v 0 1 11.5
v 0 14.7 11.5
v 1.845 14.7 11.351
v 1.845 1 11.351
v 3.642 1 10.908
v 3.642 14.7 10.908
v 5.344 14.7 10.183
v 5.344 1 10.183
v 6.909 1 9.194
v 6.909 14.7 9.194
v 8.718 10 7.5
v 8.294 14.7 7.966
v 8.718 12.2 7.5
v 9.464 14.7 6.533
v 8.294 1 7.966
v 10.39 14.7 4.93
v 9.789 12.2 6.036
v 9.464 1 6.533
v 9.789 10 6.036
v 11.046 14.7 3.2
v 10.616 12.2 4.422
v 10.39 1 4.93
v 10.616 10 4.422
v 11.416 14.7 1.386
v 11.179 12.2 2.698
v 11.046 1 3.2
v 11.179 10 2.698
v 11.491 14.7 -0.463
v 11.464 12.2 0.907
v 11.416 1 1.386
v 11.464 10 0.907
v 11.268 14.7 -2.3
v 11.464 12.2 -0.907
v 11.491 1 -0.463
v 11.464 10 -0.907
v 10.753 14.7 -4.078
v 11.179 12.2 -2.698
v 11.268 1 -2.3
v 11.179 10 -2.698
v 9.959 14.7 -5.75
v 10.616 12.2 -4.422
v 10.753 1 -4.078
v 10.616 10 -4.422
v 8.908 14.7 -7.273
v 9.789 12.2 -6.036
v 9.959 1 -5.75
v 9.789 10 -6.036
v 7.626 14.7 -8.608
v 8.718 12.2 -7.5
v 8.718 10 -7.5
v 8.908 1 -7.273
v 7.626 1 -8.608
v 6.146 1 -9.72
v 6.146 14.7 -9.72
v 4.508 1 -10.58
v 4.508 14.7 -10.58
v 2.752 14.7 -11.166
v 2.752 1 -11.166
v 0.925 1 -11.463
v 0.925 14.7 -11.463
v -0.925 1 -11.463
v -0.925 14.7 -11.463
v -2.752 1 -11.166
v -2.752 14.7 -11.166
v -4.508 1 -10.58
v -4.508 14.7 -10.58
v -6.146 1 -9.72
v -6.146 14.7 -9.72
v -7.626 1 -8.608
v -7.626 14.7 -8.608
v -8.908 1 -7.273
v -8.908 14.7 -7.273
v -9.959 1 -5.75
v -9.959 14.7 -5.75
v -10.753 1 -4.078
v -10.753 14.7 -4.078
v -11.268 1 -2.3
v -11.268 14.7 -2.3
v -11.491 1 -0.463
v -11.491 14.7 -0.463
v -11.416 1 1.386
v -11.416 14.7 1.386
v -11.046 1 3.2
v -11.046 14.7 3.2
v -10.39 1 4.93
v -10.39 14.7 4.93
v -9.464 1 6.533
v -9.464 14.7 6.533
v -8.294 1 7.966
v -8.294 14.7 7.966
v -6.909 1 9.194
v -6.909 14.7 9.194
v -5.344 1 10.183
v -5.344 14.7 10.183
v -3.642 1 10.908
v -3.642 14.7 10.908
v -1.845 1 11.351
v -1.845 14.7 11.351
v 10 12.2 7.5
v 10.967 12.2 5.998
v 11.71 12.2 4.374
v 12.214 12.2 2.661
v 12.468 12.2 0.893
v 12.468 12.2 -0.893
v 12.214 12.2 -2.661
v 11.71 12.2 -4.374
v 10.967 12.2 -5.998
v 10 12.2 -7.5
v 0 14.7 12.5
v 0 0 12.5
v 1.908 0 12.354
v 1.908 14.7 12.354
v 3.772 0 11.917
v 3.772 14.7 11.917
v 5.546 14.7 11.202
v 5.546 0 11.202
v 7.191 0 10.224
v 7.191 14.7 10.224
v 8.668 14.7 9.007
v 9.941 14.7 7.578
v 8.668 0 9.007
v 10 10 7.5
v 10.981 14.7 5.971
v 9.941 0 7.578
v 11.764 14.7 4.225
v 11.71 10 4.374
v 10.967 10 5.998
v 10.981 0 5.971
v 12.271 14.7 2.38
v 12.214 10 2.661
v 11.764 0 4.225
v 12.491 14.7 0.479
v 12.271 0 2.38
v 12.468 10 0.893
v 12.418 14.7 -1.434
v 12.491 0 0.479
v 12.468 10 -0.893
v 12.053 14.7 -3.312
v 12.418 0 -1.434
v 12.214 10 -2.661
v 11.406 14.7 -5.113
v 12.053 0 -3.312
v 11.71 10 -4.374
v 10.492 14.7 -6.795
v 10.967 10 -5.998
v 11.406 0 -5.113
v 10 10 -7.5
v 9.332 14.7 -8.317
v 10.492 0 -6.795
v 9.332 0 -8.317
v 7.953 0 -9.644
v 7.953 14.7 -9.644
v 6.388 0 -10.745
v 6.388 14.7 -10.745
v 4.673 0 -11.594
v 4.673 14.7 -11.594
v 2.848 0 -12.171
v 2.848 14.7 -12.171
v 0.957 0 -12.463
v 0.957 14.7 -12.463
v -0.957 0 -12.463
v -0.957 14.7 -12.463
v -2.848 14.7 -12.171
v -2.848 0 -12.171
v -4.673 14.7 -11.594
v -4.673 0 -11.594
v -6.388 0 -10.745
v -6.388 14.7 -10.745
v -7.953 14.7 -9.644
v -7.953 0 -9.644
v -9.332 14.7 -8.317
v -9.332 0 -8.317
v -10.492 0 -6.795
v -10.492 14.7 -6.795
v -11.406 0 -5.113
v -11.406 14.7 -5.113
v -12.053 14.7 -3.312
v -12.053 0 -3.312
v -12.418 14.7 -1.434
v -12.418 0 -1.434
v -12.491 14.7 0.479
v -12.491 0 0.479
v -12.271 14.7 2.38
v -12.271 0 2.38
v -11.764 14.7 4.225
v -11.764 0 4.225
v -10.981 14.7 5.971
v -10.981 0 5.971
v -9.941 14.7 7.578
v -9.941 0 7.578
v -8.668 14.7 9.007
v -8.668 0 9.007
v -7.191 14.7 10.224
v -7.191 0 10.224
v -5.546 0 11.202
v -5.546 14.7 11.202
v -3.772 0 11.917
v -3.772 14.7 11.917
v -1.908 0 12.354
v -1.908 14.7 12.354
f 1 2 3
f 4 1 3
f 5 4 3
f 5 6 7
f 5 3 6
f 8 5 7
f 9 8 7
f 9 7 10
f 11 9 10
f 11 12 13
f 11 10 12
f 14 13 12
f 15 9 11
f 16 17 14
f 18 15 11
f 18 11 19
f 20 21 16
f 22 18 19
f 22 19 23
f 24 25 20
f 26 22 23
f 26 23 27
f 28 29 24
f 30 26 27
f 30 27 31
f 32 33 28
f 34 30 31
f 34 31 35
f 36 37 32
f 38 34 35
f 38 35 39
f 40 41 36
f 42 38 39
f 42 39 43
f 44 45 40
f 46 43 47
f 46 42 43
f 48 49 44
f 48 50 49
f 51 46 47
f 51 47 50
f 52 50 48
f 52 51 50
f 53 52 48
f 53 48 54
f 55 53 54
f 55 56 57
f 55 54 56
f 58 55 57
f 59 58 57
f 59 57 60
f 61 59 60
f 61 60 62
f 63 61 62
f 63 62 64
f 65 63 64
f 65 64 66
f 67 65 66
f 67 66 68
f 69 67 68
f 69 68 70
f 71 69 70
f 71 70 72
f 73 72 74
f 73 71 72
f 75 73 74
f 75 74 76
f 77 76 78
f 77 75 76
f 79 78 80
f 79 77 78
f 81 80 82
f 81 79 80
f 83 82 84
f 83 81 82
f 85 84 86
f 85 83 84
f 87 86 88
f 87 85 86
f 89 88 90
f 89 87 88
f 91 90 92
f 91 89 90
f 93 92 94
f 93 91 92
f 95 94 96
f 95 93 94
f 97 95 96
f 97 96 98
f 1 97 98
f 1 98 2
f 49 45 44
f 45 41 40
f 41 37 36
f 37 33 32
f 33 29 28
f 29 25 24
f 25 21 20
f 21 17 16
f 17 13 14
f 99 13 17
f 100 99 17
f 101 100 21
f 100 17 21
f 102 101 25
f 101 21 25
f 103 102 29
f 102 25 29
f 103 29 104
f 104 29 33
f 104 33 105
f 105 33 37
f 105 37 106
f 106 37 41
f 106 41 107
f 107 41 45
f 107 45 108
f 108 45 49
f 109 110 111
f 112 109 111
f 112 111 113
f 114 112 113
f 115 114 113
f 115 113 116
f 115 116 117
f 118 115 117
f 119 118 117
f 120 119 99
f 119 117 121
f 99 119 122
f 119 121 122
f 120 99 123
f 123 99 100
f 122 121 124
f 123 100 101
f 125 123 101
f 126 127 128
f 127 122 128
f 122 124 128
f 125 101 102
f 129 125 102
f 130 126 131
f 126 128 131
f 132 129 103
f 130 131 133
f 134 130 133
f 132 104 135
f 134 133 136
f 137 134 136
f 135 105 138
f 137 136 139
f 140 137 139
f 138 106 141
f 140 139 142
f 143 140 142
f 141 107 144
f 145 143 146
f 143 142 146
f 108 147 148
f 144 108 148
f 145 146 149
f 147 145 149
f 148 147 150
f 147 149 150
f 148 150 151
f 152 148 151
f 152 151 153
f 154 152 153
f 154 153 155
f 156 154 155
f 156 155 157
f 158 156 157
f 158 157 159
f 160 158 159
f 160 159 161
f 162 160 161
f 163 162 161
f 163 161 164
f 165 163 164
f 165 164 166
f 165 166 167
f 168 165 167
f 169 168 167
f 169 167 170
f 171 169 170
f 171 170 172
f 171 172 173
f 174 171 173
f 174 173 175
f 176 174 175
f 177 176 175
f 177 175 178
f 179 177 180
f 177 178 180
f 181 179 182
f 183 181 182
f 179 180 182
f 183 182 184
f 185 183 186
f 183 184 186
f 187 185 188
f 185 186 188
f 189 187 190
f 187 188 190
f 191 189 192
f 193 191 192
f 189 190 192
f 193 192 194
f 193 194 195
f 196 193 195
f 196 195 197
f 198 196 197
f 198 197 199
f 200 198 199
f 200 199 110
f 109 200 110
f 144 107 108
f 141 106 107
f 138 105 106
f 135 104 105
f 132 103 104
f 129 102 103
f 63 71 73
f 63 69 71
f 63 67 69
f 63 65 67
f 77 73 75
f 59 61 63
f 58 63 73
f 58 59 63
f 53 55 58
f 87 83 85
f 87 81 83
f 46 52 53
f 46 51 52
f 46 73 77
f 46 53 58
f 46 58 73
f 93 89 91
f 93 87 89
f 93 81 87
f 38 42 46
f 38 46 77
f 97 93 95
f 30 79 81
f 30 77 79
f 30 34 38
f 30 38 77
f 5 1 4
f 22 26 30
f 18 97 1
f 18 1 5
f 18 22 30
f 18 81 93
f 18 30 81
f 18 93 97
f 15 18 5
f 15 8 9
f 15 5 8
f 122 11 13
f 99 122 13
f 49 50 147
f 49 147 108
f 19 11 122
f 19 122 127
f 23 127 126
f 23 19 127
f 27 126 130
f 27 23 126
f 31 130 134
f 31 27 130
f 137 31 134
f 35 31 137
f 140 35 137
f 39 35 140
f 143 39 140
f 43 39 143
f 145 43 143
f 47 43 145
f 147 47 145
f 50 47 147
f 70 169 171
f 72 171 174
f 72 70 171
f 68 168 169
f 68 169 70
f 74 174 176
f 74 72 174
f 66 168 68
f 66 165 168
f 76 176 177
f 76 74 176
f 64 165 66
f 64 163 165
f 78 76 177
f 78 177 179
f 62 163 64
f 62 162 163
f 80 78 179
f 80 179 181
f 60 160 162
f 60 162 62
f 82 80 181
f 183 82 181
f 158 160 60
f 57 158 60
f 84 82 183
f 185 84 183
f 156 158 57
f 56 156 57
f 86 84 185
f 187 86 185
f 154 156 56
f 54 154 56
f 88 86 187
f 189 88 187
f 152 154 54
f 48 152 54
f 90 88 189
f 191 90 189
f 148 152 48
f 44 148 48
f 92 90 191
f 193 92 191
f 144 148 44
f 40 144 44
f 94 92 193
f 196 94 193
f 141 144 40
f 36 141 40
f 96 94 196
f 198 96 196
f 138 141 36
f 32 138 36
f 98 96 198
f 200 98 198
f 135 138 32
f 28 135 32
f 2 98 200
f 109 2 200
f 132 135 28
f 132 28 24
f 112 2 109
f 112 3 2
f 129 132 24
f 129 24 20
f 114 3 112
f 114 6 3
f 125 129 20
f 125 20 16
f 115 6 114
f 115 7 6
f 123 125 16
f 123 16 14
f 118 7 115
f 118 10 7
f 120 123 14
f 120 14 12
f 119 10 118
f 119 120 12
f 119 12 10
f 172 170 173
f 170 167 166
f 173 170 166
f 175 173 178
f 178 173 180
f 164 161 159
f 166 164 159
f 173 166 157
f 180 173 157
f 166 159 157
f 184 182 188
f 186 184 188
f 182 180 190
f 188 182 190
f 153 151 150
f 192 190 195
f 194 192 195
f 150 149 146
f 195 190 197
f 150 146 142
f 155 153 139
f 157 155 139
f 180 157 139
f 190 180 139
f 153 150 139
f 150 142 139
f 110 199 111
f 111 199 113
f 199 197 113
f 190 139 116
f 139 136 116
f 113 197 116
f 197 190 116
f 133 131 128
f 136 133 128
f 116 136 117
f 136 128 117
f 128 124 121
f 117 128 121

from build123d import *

# Parameters (mm, degrees)
SKETCH1_R           = 12.5
BOSS_EXTRUDE1_DEPTH = 14.7
SHELL1_T            = -1
SKETCH2_W           = 15
SKETCH2_H           = 2.2
CUT_EXTRUDE1_DEPTH  = 24.7


with BuildPart() as part:
    # Sketch1 → Boss-Extrude1 (new body)
    with BuildSketch(Plane(origin=(0, 0, 0), x_dir=(1, 0, 0), z_dir=(0, 1, 0))):
        with Locations(Location((0, 0, 0), (0, 0, 270))):
            Circle(SKETCH1_R)
    extrude(amount=BOSS_EXTRUDE1_DEPTH)

    # Shell1
    shell1_openings = [part.faces().sort_by_distance(p)[0] for p in [
        (0, 14.7, 0),
    ]]
    offset(amount=SHELL1_T, openings=shell1_openings, kind=Kind.INTERSECTION)

    # Sketch2 → Cut-Extrude1 (cut)
    with BuildSketch(Plane(origin=(0, 0, 0), x_dir=(0, 0, -1), z_dir=(1, 0, 0))):
        with Locations((0, 11.1)):
            Rectangle(SKETCH2_W, SKETCH2_H)
    extrude(amount=CUT_EXTRUDE1_DEPTH, mode=Mode.SUBTRACT)


solid = part.part
